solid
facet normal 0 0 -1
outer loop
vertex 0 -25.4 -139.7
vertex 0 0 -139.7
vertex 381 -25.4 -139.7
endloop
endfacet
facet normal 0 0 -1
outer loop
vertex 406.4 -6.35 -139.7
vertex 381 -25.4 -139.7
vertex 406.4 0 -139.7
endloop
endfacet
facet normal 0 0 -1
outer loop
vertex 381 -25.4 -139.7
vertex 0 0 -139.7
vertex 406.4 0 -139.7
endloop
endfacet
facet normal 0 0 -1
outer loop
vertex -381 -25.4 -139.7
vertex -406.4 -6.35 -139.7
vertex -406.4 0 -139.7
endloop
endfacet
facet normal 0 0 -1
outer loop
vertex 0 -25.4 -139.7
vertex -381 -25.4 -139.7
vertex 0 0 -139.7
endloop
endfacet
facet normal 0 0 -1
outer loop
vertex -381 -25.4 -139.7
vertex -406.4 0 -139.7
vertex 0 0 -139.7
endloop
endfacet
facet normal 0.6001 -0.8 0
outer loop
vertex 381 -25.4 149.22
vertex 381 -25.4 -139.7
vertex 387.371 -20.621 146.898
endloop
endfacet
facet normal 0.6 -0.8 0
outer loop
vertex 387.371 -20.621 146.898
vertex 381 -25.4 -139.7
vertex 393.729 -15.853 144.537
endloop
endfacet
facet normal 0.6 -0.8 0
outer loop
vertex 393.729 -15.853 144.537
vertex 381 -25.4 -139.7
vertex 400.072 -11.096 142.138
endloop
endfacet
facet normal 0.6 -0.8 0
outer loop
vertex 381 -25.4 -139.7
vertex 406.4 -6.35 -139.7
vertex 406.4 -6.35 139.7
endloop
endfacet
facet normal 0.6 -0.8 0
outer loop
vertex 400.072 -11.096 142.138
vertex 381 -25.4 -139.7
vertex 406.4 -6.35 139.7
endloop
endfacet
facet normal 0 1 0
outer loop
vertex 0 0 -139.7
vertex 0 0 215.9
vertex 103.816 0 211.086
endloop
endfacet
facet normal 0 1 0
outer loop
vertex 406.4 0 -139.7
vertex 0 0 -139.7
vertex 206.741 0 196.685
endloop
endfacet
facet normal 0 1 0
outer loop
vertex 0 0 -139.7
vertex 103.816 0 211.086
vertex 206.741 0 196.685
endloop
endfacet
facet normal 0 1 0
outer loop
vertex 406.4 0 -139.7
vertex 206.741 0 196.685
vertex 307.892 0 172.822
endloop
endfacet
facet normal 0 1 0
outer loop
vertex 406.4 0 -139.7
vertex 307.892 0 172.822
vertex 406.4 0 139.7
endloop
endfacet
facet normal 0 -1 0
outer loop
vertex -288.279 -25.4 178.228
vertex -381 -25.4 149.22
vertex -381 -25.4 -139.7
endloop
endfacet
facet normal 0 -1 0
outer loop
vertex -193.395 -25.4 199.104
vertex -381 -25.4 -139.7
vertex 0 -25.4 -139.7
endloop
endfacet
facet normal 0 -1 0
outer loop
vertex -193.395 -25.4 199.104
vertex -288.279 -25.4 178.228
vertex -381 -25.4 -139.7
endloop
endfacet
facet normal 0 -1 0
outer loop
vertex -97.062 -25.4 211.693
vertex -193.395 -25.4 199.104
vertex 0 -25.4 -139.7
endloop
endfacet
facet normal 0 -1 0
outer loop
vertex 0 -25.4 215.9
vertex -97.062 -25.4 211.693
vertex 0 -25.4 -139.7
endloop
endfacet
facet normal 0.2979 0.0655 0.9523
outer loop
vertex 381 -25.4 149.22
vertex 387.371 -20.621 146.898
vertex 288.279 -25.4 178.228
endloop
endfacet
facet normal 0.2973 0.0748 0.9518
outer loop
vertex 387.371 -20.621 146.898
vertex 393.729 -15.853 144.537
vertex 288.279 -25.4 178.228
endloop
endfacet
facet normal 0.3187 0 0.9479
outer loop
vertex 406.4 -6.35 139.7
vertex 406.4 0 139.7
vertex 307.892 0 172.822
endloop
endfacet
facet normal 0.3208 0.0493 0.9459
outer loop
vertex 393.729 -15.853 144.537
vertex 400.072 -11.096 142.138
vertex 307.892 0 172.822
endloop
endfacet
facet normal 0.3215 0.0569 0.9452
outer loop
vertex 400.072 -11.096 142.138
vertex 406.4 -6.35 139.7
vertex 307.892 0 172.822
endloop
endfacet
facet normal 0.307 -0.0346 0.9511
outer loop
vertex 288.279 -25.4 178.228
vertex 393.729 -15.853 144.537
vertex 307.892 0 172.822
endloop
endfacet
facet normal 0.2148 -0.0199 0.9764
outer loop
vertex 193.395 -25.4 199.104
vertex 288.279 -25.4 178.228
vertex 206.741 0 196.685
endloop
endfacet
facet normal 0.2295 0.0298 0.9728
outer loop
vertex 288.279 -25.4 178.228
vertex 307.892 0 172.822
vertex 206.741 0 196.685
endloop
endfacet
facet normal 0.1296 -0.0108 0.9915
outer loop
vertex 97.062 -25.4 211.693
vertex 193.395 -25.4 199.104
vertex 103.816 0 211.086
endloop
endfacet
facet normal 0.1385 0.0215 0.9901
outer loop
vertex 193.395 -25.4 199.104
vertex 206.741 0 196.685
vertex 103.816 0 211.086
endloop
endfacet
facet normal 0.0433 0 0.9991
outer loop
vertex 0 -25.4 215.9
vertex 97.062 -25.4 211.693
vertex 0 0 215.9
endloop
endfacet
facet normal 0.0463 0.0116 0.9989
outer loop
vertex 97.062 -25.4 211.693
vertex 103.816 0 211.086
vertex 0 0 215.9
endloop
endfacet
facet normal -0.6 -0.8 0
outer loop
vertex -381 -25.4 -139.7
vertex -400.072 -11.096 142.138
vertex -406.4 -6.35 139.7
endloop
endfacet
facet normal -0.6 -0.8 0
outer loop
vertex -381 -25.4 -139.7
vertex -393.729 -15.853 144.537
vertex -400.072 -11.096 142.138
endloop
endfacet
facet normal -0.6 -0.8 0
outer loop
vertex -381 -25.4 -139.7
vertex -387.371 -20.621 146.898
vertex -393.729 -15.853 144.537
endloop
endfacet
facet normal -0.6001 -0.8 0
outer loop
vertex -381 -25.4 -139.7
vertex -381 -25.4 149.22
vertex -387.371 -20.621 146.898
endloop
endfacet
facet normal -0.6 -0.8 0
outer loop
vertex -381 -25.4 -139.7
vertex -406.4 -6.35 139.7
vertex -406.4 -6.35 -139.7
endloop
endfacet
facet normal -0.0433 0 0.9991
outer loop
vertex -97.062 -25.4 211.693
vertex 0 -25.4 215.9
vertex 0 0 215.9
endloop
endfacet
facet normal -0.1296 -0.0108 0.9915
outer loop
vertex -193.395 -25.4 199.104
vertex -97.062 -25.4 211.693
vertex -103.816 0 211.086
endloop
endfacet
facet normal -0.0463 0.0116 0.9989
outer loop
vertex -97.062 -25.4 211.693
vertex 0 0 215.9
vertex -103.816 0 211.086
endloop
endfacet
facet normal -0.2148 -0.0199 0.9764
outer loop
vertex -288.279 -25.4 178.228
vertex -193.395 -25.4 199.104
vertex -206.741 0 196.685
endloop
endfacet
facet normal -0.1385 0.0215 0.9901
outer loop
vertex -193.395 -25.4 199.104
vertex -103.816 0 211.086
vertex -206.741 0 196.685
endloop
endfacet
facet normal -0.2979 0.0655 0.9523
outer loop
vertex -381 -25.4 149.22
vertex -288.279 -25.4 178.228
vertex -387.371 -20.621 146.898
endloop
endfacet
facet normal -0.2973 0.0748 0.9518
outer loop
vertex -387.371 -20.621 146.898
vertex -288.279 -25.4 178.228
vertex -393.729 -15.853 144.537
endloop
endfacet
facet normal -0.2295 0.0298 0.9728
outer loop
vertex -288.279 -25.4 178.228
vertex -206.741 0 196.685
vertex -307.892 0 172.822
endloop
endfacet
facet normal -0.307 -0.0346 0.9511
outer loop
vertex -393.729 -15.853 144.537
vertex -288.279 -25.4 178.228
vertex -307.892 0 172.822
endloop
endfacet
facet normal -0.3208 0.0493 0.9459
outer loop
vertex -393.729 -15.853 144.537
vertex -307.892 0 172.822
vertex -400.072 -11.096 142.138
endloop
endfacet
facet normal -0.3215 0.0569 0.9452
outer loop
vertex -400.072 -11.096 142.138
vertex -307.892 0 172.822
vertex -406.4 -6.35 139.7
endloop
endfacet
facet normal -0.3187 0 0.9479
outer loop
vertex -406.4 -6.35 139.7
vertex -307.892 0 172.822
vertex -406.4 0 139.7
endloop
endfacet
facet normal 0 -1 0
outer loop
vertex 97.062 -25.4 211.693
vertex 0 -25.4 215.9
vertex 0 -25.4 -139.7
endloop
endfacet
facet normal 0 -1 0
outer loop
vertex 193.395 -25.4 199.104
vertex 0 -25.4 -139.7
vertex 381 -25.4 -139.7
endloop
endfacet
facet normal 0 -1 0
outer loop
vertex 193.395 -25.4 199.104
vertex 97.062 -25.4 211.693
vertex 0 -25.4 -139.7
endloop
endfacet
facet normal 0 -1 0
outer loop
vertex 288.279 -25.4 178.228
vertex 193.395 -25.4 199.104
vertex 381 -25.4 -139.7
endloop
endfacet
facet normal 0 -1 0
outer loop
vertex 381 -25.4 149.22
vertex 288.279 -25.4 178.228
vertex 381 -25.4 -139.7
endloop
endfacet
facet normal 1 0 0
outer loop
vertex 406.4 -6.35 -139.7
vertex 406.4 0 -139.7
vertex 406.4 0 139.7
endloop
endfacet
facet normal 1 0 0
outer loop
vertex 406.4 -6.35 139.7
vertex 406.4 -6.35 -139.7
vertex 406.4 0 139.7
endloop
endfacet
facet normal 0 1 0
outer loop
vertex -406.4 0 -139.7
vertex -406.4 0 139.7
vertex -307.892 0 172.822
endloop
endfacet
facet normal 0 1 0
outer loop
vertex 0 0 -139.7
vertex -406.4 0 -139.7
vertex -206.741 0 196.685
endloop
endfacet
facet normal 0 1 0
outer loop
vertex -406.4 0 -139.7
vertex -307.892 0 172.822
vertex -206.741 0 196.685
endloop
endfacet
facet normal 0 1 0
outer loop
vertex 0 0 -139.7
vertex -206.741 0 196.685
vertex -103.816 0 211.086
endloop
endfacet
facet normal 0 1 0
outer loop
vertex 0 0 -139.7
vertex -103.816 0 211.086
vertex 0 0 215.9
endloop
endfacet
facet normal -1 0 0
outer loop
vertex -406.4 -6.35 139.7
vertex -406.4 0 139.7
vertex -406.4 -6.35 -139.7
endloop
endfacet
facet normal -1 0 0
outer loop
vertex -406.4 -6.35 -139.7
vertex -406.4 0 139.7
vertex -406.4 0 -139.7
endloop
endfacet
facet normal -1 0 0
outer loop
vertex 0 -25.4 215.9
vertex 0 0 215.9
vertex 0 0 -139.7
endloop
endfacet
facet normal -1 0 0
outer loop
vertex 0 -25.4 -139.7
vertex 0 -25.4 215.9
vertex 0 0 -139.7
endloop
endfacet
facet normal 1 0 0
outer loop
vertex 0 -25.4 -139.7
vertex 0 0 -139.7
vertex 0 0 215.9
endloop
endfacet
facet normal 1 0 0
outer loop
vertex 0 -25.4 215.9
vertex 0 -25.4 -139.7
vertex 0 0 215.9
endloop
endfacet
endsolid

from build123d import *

# Parameters (mm, degrees)
F1_DEPTH = 25.4
F2_DEPTH = 25.4
F3_SIZE2 = 25.4
F3_SIZE  = 19.05
F4_SIZE2 = 19.05
F4_SIZE  = 25.4


with BuildPart() as f1:
    # F0 (on Front) → F1 (new body)
    with BuildSketch(Plane.XZ):
        with BuildLine():
            Line((-406.4, -139.7), (0, -139.7))
            Line((0, -139.7), (0, 215.9))
            ThreePointArc((0, 215.9), (-206.7410215705, 196.6854483758), (-406.4, 139.7))
            Line((-406.4, 139.7), (-406.4, -139.7))
        make_face()
    extrude(amount=F1_DEPTH)

    # F3
    f3_edges = [f1.edges().sort_by_distance(p)[0] for p in [
        (-406.4, -25.4, 0),
    ]]
    f3_side = f1.faces().sort_by_distance((-406.4, -12.7, 0))[0]
    chamfer(f3_edges, length=F3_SIZE, length2=F3_SIZE2, reference=f3_side)


with BuildPart() as f2:
    # F0 (on Front) → F2 (new body)
    with BuildSketch(Plane.XZ):
        with BuildLine():
            Line((0, -139.7), (406.4, -139.7))
            Line((406.4, -139.7), (406.4, 139.7))
            ThreePointArc((406.4, 139.7), (206.7410215705, 196.6854483758), (0, 215.9))
            Line((0, 215.9), (0, -139.7))
        make_face()
    extrude(amount=F2_DEPTH)

    # F4
    f4_edges = [f2.edges().sort_by_distance(p)[0] for p in [
        (406.4, -25.4, 0),
    ]]
    f4_side = f2.faces().sort_by_distance((195.449001, -25.4, 26.350373))[0]
    chamfer(f4_edges, length=F4_SIZE, length2=F4_SIZE2, reference=f4_side)


solid = Compound([f1.part, f2.part])
